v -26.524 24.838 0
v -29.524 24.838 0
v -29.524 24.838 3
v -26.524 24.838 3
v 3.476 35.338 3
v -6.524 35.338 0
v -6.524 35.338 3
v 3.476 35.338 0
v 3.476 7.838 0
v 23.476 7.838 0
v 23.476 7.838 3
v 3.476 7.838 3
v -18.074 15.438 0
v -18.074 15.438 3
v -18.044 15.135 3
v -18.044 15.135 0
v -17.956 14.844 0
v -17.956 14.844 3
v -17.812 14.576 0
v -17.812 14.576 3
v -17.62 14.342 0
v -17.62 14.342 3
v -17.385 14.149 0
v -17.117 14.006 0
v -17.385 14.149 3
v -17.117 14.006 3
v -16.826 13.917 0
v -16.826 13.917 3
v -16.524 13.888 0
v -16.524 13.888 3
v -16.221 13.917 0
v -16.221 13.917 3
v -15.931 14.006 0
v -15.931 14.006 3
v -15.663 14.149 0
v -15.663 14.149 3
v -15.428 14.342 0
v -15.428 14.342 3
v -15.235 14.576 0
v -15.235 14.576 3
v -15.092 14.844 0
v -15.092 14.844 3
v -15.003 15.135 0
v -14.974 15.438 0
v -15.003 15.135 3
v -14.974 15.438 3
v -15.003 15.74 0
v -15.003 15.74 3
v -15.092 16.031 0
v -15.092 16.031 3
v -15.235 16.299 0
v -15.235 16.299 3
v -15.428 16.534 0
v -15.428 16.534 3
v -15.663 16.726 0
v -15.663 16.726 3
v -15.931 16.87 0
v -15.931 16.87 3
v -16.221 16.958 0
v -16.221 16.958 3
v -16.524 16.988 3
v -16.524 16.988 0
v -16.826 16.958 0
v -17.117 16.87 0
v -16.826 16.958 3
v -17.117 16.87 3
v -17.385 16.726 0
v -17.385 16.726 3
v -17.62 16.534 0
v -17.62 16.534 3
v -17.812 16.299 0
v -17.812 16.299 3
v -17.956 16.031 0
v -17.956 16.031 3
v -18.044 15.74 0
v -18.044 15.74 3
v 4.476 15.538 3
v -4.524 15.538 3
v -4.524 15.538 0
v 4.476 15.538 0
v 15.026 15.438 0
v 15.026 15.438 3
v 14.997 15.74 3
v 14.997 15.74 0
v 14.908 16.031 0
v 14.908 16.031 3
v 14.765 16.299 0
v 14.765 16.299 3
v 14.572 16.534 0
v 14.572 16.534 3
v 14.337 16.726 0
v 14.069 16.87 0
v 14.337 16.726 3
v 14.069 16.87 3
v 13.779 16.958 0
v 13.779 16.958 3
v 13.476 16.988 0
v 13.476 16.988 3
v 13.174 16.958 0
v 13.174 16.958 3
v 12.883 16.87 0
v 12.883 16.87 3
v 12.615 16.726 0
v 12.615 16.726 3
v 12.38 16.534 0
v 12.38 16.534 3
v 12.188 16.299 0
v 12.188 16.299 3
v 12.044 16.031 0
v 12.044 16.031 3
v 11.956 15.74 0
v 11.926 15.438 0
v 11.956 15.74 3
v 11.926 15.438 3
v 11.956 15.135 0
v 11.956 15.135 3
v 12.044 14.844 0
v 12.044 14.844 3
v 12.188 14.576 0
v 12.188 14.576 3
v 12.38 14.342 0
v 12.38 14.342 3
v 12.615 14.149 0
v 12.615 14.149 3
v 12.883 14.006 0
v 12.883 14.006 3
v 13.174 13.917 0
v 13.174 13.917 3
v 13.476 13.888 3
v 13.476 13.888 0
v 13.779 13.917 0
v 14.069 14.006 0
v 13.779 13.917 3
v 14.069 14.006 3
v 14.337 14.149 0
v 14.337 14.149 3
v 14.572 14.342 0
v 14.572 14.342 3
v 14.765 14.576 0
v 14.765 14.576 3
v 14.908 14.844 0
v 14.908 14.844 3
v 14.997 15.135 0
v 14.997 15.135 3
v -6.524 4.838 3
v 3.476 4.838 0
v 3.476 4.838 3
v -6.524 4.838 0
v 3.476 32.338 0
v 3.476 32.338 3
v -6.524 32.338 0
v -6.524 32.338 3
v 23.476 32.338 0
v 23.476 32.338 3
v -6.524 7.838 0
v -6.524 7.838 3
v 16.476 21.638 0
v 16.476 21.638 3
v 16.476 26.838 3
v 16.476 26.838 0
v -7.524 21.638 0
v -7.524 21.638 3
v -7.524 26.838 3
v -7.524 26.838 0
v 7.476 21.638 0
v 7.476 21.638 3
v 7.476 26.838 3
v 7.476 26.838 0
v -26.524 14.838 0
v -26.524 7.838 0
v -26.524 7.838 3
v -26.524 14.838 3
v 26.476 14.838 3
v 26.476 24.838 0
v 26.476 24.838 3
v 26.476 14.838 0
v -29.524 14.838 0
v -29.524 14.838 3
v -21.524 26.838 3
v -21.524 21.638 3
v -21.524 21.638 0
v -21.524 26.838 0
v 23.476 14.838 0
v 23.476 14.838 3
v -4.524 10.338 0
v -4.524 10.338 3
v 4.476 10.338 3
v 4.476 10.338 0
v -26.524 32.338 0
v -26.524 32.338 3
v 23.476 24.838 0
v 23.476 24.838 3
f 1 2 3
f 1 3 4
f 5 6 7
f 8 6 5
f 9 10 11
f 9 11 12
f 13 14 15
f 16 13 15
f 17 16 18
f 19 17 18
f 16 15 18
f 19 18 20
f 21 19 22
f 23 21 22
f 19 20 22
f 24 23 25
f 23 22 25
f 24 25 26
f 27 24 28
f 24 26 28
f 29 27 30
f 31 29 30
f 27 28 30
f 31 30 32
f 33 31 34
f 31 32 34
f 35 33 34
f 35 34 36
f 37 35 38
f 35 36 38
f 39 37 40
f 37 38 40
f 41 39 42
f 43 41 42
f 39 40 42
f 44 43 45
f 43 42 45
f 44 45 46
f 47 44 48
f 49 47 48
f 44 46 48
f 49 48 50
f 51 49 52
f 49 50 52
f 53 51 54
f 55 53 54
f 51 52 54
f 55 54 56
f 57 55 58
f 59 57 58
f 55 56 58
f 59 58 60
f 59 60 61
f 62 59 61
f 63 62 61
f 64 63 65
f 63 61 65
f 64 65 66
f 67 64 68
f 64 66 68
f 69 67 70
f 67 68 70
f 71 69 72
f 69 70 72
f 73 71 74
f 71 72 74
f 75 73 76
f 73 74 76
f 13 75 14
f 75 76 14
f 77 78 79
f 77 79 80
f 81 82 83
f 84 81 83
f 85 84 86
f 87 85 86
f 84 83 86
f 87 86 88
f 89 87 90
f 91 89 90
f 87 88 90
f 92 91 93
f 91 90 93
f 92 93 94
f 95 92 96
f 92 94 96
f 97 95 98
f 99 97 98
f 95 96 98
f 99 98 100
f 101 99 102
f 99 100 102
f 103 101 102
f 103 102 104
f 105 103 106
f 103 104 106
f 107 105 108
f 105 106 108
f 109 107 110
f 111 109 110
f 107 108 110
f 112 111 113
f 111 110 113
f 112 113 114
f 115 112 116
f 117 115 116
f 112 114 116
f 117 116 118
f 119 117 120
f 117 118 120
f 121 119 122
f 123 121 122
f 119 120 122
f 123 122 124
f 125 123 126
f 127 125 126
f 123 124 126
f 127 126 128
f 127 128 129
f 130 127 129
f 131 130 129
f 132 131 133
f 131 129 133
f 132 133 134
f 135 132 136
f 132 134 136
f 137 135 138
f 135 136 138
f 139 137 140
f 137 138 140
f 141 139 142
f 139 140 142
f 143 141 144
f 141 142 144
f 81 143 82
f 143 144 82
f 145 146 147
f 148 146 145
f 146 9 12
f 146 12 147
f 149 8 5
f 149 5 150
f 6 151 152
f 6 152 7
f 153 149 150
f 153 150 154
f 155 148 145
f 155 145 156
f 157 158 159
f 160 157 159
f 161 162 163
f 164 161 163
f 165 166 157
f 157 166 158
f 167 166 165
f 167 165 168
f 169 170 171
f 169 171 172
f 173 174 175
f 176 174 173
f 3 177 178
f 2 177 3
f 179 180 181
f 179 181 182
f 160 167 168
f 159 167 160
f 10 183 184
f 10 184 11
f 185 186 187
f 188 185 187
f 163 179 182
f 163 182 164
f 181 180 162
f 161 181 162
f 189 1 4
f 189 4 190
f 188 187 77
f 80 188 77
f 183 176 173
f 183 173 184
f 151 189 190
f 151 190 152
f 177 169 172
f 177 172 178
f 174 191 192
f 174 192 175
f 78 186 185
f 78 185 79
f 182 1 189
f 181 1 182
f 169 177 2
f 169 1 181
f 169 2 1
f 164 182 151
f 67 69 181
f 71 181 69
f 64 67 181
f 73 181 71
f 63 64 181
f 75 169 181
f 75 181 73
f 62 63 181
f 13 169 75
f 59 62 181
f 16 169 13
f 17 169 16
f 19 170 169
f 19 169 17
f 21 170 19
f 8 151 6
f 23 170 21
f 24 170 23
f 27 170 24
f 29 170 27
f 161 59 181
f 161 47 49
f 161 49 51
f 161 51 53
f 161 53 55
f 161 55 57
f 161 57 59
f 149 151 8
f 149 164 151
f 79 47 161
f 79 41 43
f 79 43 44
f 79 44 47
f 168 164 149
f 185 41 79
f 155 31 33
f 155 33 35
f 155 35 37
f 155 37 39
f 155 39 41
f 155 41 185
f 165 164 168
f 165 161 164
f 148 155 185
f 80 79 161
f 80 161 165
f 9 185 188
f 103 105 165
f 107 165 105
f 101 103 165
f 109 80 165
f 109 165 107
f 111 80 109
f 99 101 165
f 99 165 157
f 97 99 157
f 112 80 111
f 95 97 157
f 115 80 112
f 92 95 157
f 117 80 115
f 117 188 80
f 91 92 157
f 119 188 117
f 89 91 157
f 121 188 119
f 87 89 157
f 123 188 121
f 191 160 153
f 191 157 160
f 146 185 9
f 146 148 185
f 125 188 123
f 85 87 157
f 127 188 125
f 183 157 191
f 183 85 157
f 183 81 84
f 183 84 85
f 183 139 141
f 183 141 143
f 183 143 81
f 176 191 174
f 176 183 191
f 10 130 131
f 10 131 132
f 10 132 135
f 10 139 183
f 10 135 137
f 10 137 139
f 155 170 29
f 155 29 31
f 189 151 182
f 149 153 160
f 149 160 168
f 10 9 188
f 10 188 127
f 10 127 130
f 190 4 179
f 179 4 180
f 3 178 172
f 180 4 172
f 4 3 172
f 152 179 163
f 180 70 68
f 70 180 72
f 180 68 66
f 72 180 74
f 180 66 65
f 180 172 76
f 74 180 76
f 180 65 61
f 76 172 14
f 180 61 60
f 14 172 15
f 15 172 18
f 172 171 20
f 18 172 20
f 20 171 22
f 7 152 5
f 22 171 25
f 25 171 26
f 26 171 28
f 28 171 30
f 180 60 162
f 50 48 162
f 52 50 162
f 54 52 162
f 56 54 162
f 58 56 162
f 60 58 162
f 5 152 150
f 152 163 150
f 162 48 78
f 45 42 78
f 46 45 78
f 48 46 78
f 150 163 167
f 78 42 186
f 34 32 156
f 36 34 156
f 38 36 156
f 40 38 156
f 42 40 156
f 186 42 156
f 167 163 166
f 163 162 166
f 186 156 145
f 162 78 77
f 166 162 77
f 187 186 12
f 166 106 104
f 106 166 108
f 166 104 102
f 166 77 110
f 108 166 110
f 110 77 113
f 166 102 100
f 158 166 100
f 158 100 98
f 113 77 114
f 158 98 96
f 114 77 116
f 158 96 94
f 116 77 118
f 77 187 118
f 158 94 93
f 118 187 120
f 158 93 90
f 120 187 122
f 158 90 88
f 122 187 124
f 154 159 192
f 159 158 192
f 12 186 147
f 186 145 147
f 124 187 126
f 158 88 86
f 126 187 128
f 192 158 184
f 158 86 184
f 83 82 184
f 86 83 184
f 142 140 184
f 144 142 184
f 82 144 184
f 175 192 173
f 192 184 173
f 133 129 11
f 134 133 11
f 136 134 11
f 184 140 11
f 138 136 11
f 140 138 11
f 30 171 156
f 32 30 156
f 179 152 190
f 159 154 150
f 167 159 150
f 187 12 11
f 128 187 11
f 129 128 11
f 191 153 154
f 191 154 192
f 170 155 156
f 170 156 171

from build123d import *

# Parameters (mm, degrees)
BOSS_EXTRUDE1_DEPTH = 3
SKETCH4_R           = 1.55
SKETCH4_W           = 9
SKETCH4_H           = 5.2
SKETCH4_W_2         = 14
CUT_EXTRUDE1_DEPTH  = 3


with BuildPart() as part:
    # Sketch1 → Boss-Extrude1 (new body)
    with BuildSketch(Plane(origin=(0, 0, 0), x_dir=(-1, 0, 0), z_dir=(0, 0, 1))):
        Polygon((-3.476318152, -7.837615564), (-3.476318152, -4.837615564), (6.523681848, -4.837615564), (6.523681848, -7.837615564), (26.523681848, -7.837615564), (26.523681848, -14.837615564), (29.523681848, -14.837615564), (29.523681848, -24.837615564), (26.523681848, -24.837615564), (26.523681848, -32.337615564), (6.523681848, -32.337615564), (6.523681848, -35.337615564), (-3.476318152, -35.337615564), (-3.476318152, -32.337615564), (-23.476318152, -32.337615564), (-23.476318152, -24.837615564), (-26.476318152, -24.837615564), (-26.476318152, -14.837615564), (-23.476318152, -14.837615564), (-23.476318152, -7.837615564), align=None)
    extrude(amount=BOSS_EXTRUDE1_DEPTH)

    # Sketch4 → Cut-Extrude1 (cut)
    with BuildSketch(Plane.XY.offset(3)):
        with Locations((13.476318152, 15.437615564)):
            Circle(SKETCH4_R)
        with Locations(Location((-16.523681848, 15.437615564, 0), (0, 0, 180))):
            Circle(SKETCH4_R)
        with Locations((-0.023681848, 12.937615564)):
            Rectangle(SKETCH4_W, SKETCH4_H)
        with Locations((11.976318152, 24.237615564)):
            Rectangle(SKETCH4_W, SKETCH4_H)
        with Locations((-14.523681848, 24.237615564)):
            Rectangle(SKETCH4_W_2, SKETCH4_H)
    extrude(amount=-CUT_EXTRUDE1_DEPTH, mode=Mode.SUBTRACT)


solid = part.part
